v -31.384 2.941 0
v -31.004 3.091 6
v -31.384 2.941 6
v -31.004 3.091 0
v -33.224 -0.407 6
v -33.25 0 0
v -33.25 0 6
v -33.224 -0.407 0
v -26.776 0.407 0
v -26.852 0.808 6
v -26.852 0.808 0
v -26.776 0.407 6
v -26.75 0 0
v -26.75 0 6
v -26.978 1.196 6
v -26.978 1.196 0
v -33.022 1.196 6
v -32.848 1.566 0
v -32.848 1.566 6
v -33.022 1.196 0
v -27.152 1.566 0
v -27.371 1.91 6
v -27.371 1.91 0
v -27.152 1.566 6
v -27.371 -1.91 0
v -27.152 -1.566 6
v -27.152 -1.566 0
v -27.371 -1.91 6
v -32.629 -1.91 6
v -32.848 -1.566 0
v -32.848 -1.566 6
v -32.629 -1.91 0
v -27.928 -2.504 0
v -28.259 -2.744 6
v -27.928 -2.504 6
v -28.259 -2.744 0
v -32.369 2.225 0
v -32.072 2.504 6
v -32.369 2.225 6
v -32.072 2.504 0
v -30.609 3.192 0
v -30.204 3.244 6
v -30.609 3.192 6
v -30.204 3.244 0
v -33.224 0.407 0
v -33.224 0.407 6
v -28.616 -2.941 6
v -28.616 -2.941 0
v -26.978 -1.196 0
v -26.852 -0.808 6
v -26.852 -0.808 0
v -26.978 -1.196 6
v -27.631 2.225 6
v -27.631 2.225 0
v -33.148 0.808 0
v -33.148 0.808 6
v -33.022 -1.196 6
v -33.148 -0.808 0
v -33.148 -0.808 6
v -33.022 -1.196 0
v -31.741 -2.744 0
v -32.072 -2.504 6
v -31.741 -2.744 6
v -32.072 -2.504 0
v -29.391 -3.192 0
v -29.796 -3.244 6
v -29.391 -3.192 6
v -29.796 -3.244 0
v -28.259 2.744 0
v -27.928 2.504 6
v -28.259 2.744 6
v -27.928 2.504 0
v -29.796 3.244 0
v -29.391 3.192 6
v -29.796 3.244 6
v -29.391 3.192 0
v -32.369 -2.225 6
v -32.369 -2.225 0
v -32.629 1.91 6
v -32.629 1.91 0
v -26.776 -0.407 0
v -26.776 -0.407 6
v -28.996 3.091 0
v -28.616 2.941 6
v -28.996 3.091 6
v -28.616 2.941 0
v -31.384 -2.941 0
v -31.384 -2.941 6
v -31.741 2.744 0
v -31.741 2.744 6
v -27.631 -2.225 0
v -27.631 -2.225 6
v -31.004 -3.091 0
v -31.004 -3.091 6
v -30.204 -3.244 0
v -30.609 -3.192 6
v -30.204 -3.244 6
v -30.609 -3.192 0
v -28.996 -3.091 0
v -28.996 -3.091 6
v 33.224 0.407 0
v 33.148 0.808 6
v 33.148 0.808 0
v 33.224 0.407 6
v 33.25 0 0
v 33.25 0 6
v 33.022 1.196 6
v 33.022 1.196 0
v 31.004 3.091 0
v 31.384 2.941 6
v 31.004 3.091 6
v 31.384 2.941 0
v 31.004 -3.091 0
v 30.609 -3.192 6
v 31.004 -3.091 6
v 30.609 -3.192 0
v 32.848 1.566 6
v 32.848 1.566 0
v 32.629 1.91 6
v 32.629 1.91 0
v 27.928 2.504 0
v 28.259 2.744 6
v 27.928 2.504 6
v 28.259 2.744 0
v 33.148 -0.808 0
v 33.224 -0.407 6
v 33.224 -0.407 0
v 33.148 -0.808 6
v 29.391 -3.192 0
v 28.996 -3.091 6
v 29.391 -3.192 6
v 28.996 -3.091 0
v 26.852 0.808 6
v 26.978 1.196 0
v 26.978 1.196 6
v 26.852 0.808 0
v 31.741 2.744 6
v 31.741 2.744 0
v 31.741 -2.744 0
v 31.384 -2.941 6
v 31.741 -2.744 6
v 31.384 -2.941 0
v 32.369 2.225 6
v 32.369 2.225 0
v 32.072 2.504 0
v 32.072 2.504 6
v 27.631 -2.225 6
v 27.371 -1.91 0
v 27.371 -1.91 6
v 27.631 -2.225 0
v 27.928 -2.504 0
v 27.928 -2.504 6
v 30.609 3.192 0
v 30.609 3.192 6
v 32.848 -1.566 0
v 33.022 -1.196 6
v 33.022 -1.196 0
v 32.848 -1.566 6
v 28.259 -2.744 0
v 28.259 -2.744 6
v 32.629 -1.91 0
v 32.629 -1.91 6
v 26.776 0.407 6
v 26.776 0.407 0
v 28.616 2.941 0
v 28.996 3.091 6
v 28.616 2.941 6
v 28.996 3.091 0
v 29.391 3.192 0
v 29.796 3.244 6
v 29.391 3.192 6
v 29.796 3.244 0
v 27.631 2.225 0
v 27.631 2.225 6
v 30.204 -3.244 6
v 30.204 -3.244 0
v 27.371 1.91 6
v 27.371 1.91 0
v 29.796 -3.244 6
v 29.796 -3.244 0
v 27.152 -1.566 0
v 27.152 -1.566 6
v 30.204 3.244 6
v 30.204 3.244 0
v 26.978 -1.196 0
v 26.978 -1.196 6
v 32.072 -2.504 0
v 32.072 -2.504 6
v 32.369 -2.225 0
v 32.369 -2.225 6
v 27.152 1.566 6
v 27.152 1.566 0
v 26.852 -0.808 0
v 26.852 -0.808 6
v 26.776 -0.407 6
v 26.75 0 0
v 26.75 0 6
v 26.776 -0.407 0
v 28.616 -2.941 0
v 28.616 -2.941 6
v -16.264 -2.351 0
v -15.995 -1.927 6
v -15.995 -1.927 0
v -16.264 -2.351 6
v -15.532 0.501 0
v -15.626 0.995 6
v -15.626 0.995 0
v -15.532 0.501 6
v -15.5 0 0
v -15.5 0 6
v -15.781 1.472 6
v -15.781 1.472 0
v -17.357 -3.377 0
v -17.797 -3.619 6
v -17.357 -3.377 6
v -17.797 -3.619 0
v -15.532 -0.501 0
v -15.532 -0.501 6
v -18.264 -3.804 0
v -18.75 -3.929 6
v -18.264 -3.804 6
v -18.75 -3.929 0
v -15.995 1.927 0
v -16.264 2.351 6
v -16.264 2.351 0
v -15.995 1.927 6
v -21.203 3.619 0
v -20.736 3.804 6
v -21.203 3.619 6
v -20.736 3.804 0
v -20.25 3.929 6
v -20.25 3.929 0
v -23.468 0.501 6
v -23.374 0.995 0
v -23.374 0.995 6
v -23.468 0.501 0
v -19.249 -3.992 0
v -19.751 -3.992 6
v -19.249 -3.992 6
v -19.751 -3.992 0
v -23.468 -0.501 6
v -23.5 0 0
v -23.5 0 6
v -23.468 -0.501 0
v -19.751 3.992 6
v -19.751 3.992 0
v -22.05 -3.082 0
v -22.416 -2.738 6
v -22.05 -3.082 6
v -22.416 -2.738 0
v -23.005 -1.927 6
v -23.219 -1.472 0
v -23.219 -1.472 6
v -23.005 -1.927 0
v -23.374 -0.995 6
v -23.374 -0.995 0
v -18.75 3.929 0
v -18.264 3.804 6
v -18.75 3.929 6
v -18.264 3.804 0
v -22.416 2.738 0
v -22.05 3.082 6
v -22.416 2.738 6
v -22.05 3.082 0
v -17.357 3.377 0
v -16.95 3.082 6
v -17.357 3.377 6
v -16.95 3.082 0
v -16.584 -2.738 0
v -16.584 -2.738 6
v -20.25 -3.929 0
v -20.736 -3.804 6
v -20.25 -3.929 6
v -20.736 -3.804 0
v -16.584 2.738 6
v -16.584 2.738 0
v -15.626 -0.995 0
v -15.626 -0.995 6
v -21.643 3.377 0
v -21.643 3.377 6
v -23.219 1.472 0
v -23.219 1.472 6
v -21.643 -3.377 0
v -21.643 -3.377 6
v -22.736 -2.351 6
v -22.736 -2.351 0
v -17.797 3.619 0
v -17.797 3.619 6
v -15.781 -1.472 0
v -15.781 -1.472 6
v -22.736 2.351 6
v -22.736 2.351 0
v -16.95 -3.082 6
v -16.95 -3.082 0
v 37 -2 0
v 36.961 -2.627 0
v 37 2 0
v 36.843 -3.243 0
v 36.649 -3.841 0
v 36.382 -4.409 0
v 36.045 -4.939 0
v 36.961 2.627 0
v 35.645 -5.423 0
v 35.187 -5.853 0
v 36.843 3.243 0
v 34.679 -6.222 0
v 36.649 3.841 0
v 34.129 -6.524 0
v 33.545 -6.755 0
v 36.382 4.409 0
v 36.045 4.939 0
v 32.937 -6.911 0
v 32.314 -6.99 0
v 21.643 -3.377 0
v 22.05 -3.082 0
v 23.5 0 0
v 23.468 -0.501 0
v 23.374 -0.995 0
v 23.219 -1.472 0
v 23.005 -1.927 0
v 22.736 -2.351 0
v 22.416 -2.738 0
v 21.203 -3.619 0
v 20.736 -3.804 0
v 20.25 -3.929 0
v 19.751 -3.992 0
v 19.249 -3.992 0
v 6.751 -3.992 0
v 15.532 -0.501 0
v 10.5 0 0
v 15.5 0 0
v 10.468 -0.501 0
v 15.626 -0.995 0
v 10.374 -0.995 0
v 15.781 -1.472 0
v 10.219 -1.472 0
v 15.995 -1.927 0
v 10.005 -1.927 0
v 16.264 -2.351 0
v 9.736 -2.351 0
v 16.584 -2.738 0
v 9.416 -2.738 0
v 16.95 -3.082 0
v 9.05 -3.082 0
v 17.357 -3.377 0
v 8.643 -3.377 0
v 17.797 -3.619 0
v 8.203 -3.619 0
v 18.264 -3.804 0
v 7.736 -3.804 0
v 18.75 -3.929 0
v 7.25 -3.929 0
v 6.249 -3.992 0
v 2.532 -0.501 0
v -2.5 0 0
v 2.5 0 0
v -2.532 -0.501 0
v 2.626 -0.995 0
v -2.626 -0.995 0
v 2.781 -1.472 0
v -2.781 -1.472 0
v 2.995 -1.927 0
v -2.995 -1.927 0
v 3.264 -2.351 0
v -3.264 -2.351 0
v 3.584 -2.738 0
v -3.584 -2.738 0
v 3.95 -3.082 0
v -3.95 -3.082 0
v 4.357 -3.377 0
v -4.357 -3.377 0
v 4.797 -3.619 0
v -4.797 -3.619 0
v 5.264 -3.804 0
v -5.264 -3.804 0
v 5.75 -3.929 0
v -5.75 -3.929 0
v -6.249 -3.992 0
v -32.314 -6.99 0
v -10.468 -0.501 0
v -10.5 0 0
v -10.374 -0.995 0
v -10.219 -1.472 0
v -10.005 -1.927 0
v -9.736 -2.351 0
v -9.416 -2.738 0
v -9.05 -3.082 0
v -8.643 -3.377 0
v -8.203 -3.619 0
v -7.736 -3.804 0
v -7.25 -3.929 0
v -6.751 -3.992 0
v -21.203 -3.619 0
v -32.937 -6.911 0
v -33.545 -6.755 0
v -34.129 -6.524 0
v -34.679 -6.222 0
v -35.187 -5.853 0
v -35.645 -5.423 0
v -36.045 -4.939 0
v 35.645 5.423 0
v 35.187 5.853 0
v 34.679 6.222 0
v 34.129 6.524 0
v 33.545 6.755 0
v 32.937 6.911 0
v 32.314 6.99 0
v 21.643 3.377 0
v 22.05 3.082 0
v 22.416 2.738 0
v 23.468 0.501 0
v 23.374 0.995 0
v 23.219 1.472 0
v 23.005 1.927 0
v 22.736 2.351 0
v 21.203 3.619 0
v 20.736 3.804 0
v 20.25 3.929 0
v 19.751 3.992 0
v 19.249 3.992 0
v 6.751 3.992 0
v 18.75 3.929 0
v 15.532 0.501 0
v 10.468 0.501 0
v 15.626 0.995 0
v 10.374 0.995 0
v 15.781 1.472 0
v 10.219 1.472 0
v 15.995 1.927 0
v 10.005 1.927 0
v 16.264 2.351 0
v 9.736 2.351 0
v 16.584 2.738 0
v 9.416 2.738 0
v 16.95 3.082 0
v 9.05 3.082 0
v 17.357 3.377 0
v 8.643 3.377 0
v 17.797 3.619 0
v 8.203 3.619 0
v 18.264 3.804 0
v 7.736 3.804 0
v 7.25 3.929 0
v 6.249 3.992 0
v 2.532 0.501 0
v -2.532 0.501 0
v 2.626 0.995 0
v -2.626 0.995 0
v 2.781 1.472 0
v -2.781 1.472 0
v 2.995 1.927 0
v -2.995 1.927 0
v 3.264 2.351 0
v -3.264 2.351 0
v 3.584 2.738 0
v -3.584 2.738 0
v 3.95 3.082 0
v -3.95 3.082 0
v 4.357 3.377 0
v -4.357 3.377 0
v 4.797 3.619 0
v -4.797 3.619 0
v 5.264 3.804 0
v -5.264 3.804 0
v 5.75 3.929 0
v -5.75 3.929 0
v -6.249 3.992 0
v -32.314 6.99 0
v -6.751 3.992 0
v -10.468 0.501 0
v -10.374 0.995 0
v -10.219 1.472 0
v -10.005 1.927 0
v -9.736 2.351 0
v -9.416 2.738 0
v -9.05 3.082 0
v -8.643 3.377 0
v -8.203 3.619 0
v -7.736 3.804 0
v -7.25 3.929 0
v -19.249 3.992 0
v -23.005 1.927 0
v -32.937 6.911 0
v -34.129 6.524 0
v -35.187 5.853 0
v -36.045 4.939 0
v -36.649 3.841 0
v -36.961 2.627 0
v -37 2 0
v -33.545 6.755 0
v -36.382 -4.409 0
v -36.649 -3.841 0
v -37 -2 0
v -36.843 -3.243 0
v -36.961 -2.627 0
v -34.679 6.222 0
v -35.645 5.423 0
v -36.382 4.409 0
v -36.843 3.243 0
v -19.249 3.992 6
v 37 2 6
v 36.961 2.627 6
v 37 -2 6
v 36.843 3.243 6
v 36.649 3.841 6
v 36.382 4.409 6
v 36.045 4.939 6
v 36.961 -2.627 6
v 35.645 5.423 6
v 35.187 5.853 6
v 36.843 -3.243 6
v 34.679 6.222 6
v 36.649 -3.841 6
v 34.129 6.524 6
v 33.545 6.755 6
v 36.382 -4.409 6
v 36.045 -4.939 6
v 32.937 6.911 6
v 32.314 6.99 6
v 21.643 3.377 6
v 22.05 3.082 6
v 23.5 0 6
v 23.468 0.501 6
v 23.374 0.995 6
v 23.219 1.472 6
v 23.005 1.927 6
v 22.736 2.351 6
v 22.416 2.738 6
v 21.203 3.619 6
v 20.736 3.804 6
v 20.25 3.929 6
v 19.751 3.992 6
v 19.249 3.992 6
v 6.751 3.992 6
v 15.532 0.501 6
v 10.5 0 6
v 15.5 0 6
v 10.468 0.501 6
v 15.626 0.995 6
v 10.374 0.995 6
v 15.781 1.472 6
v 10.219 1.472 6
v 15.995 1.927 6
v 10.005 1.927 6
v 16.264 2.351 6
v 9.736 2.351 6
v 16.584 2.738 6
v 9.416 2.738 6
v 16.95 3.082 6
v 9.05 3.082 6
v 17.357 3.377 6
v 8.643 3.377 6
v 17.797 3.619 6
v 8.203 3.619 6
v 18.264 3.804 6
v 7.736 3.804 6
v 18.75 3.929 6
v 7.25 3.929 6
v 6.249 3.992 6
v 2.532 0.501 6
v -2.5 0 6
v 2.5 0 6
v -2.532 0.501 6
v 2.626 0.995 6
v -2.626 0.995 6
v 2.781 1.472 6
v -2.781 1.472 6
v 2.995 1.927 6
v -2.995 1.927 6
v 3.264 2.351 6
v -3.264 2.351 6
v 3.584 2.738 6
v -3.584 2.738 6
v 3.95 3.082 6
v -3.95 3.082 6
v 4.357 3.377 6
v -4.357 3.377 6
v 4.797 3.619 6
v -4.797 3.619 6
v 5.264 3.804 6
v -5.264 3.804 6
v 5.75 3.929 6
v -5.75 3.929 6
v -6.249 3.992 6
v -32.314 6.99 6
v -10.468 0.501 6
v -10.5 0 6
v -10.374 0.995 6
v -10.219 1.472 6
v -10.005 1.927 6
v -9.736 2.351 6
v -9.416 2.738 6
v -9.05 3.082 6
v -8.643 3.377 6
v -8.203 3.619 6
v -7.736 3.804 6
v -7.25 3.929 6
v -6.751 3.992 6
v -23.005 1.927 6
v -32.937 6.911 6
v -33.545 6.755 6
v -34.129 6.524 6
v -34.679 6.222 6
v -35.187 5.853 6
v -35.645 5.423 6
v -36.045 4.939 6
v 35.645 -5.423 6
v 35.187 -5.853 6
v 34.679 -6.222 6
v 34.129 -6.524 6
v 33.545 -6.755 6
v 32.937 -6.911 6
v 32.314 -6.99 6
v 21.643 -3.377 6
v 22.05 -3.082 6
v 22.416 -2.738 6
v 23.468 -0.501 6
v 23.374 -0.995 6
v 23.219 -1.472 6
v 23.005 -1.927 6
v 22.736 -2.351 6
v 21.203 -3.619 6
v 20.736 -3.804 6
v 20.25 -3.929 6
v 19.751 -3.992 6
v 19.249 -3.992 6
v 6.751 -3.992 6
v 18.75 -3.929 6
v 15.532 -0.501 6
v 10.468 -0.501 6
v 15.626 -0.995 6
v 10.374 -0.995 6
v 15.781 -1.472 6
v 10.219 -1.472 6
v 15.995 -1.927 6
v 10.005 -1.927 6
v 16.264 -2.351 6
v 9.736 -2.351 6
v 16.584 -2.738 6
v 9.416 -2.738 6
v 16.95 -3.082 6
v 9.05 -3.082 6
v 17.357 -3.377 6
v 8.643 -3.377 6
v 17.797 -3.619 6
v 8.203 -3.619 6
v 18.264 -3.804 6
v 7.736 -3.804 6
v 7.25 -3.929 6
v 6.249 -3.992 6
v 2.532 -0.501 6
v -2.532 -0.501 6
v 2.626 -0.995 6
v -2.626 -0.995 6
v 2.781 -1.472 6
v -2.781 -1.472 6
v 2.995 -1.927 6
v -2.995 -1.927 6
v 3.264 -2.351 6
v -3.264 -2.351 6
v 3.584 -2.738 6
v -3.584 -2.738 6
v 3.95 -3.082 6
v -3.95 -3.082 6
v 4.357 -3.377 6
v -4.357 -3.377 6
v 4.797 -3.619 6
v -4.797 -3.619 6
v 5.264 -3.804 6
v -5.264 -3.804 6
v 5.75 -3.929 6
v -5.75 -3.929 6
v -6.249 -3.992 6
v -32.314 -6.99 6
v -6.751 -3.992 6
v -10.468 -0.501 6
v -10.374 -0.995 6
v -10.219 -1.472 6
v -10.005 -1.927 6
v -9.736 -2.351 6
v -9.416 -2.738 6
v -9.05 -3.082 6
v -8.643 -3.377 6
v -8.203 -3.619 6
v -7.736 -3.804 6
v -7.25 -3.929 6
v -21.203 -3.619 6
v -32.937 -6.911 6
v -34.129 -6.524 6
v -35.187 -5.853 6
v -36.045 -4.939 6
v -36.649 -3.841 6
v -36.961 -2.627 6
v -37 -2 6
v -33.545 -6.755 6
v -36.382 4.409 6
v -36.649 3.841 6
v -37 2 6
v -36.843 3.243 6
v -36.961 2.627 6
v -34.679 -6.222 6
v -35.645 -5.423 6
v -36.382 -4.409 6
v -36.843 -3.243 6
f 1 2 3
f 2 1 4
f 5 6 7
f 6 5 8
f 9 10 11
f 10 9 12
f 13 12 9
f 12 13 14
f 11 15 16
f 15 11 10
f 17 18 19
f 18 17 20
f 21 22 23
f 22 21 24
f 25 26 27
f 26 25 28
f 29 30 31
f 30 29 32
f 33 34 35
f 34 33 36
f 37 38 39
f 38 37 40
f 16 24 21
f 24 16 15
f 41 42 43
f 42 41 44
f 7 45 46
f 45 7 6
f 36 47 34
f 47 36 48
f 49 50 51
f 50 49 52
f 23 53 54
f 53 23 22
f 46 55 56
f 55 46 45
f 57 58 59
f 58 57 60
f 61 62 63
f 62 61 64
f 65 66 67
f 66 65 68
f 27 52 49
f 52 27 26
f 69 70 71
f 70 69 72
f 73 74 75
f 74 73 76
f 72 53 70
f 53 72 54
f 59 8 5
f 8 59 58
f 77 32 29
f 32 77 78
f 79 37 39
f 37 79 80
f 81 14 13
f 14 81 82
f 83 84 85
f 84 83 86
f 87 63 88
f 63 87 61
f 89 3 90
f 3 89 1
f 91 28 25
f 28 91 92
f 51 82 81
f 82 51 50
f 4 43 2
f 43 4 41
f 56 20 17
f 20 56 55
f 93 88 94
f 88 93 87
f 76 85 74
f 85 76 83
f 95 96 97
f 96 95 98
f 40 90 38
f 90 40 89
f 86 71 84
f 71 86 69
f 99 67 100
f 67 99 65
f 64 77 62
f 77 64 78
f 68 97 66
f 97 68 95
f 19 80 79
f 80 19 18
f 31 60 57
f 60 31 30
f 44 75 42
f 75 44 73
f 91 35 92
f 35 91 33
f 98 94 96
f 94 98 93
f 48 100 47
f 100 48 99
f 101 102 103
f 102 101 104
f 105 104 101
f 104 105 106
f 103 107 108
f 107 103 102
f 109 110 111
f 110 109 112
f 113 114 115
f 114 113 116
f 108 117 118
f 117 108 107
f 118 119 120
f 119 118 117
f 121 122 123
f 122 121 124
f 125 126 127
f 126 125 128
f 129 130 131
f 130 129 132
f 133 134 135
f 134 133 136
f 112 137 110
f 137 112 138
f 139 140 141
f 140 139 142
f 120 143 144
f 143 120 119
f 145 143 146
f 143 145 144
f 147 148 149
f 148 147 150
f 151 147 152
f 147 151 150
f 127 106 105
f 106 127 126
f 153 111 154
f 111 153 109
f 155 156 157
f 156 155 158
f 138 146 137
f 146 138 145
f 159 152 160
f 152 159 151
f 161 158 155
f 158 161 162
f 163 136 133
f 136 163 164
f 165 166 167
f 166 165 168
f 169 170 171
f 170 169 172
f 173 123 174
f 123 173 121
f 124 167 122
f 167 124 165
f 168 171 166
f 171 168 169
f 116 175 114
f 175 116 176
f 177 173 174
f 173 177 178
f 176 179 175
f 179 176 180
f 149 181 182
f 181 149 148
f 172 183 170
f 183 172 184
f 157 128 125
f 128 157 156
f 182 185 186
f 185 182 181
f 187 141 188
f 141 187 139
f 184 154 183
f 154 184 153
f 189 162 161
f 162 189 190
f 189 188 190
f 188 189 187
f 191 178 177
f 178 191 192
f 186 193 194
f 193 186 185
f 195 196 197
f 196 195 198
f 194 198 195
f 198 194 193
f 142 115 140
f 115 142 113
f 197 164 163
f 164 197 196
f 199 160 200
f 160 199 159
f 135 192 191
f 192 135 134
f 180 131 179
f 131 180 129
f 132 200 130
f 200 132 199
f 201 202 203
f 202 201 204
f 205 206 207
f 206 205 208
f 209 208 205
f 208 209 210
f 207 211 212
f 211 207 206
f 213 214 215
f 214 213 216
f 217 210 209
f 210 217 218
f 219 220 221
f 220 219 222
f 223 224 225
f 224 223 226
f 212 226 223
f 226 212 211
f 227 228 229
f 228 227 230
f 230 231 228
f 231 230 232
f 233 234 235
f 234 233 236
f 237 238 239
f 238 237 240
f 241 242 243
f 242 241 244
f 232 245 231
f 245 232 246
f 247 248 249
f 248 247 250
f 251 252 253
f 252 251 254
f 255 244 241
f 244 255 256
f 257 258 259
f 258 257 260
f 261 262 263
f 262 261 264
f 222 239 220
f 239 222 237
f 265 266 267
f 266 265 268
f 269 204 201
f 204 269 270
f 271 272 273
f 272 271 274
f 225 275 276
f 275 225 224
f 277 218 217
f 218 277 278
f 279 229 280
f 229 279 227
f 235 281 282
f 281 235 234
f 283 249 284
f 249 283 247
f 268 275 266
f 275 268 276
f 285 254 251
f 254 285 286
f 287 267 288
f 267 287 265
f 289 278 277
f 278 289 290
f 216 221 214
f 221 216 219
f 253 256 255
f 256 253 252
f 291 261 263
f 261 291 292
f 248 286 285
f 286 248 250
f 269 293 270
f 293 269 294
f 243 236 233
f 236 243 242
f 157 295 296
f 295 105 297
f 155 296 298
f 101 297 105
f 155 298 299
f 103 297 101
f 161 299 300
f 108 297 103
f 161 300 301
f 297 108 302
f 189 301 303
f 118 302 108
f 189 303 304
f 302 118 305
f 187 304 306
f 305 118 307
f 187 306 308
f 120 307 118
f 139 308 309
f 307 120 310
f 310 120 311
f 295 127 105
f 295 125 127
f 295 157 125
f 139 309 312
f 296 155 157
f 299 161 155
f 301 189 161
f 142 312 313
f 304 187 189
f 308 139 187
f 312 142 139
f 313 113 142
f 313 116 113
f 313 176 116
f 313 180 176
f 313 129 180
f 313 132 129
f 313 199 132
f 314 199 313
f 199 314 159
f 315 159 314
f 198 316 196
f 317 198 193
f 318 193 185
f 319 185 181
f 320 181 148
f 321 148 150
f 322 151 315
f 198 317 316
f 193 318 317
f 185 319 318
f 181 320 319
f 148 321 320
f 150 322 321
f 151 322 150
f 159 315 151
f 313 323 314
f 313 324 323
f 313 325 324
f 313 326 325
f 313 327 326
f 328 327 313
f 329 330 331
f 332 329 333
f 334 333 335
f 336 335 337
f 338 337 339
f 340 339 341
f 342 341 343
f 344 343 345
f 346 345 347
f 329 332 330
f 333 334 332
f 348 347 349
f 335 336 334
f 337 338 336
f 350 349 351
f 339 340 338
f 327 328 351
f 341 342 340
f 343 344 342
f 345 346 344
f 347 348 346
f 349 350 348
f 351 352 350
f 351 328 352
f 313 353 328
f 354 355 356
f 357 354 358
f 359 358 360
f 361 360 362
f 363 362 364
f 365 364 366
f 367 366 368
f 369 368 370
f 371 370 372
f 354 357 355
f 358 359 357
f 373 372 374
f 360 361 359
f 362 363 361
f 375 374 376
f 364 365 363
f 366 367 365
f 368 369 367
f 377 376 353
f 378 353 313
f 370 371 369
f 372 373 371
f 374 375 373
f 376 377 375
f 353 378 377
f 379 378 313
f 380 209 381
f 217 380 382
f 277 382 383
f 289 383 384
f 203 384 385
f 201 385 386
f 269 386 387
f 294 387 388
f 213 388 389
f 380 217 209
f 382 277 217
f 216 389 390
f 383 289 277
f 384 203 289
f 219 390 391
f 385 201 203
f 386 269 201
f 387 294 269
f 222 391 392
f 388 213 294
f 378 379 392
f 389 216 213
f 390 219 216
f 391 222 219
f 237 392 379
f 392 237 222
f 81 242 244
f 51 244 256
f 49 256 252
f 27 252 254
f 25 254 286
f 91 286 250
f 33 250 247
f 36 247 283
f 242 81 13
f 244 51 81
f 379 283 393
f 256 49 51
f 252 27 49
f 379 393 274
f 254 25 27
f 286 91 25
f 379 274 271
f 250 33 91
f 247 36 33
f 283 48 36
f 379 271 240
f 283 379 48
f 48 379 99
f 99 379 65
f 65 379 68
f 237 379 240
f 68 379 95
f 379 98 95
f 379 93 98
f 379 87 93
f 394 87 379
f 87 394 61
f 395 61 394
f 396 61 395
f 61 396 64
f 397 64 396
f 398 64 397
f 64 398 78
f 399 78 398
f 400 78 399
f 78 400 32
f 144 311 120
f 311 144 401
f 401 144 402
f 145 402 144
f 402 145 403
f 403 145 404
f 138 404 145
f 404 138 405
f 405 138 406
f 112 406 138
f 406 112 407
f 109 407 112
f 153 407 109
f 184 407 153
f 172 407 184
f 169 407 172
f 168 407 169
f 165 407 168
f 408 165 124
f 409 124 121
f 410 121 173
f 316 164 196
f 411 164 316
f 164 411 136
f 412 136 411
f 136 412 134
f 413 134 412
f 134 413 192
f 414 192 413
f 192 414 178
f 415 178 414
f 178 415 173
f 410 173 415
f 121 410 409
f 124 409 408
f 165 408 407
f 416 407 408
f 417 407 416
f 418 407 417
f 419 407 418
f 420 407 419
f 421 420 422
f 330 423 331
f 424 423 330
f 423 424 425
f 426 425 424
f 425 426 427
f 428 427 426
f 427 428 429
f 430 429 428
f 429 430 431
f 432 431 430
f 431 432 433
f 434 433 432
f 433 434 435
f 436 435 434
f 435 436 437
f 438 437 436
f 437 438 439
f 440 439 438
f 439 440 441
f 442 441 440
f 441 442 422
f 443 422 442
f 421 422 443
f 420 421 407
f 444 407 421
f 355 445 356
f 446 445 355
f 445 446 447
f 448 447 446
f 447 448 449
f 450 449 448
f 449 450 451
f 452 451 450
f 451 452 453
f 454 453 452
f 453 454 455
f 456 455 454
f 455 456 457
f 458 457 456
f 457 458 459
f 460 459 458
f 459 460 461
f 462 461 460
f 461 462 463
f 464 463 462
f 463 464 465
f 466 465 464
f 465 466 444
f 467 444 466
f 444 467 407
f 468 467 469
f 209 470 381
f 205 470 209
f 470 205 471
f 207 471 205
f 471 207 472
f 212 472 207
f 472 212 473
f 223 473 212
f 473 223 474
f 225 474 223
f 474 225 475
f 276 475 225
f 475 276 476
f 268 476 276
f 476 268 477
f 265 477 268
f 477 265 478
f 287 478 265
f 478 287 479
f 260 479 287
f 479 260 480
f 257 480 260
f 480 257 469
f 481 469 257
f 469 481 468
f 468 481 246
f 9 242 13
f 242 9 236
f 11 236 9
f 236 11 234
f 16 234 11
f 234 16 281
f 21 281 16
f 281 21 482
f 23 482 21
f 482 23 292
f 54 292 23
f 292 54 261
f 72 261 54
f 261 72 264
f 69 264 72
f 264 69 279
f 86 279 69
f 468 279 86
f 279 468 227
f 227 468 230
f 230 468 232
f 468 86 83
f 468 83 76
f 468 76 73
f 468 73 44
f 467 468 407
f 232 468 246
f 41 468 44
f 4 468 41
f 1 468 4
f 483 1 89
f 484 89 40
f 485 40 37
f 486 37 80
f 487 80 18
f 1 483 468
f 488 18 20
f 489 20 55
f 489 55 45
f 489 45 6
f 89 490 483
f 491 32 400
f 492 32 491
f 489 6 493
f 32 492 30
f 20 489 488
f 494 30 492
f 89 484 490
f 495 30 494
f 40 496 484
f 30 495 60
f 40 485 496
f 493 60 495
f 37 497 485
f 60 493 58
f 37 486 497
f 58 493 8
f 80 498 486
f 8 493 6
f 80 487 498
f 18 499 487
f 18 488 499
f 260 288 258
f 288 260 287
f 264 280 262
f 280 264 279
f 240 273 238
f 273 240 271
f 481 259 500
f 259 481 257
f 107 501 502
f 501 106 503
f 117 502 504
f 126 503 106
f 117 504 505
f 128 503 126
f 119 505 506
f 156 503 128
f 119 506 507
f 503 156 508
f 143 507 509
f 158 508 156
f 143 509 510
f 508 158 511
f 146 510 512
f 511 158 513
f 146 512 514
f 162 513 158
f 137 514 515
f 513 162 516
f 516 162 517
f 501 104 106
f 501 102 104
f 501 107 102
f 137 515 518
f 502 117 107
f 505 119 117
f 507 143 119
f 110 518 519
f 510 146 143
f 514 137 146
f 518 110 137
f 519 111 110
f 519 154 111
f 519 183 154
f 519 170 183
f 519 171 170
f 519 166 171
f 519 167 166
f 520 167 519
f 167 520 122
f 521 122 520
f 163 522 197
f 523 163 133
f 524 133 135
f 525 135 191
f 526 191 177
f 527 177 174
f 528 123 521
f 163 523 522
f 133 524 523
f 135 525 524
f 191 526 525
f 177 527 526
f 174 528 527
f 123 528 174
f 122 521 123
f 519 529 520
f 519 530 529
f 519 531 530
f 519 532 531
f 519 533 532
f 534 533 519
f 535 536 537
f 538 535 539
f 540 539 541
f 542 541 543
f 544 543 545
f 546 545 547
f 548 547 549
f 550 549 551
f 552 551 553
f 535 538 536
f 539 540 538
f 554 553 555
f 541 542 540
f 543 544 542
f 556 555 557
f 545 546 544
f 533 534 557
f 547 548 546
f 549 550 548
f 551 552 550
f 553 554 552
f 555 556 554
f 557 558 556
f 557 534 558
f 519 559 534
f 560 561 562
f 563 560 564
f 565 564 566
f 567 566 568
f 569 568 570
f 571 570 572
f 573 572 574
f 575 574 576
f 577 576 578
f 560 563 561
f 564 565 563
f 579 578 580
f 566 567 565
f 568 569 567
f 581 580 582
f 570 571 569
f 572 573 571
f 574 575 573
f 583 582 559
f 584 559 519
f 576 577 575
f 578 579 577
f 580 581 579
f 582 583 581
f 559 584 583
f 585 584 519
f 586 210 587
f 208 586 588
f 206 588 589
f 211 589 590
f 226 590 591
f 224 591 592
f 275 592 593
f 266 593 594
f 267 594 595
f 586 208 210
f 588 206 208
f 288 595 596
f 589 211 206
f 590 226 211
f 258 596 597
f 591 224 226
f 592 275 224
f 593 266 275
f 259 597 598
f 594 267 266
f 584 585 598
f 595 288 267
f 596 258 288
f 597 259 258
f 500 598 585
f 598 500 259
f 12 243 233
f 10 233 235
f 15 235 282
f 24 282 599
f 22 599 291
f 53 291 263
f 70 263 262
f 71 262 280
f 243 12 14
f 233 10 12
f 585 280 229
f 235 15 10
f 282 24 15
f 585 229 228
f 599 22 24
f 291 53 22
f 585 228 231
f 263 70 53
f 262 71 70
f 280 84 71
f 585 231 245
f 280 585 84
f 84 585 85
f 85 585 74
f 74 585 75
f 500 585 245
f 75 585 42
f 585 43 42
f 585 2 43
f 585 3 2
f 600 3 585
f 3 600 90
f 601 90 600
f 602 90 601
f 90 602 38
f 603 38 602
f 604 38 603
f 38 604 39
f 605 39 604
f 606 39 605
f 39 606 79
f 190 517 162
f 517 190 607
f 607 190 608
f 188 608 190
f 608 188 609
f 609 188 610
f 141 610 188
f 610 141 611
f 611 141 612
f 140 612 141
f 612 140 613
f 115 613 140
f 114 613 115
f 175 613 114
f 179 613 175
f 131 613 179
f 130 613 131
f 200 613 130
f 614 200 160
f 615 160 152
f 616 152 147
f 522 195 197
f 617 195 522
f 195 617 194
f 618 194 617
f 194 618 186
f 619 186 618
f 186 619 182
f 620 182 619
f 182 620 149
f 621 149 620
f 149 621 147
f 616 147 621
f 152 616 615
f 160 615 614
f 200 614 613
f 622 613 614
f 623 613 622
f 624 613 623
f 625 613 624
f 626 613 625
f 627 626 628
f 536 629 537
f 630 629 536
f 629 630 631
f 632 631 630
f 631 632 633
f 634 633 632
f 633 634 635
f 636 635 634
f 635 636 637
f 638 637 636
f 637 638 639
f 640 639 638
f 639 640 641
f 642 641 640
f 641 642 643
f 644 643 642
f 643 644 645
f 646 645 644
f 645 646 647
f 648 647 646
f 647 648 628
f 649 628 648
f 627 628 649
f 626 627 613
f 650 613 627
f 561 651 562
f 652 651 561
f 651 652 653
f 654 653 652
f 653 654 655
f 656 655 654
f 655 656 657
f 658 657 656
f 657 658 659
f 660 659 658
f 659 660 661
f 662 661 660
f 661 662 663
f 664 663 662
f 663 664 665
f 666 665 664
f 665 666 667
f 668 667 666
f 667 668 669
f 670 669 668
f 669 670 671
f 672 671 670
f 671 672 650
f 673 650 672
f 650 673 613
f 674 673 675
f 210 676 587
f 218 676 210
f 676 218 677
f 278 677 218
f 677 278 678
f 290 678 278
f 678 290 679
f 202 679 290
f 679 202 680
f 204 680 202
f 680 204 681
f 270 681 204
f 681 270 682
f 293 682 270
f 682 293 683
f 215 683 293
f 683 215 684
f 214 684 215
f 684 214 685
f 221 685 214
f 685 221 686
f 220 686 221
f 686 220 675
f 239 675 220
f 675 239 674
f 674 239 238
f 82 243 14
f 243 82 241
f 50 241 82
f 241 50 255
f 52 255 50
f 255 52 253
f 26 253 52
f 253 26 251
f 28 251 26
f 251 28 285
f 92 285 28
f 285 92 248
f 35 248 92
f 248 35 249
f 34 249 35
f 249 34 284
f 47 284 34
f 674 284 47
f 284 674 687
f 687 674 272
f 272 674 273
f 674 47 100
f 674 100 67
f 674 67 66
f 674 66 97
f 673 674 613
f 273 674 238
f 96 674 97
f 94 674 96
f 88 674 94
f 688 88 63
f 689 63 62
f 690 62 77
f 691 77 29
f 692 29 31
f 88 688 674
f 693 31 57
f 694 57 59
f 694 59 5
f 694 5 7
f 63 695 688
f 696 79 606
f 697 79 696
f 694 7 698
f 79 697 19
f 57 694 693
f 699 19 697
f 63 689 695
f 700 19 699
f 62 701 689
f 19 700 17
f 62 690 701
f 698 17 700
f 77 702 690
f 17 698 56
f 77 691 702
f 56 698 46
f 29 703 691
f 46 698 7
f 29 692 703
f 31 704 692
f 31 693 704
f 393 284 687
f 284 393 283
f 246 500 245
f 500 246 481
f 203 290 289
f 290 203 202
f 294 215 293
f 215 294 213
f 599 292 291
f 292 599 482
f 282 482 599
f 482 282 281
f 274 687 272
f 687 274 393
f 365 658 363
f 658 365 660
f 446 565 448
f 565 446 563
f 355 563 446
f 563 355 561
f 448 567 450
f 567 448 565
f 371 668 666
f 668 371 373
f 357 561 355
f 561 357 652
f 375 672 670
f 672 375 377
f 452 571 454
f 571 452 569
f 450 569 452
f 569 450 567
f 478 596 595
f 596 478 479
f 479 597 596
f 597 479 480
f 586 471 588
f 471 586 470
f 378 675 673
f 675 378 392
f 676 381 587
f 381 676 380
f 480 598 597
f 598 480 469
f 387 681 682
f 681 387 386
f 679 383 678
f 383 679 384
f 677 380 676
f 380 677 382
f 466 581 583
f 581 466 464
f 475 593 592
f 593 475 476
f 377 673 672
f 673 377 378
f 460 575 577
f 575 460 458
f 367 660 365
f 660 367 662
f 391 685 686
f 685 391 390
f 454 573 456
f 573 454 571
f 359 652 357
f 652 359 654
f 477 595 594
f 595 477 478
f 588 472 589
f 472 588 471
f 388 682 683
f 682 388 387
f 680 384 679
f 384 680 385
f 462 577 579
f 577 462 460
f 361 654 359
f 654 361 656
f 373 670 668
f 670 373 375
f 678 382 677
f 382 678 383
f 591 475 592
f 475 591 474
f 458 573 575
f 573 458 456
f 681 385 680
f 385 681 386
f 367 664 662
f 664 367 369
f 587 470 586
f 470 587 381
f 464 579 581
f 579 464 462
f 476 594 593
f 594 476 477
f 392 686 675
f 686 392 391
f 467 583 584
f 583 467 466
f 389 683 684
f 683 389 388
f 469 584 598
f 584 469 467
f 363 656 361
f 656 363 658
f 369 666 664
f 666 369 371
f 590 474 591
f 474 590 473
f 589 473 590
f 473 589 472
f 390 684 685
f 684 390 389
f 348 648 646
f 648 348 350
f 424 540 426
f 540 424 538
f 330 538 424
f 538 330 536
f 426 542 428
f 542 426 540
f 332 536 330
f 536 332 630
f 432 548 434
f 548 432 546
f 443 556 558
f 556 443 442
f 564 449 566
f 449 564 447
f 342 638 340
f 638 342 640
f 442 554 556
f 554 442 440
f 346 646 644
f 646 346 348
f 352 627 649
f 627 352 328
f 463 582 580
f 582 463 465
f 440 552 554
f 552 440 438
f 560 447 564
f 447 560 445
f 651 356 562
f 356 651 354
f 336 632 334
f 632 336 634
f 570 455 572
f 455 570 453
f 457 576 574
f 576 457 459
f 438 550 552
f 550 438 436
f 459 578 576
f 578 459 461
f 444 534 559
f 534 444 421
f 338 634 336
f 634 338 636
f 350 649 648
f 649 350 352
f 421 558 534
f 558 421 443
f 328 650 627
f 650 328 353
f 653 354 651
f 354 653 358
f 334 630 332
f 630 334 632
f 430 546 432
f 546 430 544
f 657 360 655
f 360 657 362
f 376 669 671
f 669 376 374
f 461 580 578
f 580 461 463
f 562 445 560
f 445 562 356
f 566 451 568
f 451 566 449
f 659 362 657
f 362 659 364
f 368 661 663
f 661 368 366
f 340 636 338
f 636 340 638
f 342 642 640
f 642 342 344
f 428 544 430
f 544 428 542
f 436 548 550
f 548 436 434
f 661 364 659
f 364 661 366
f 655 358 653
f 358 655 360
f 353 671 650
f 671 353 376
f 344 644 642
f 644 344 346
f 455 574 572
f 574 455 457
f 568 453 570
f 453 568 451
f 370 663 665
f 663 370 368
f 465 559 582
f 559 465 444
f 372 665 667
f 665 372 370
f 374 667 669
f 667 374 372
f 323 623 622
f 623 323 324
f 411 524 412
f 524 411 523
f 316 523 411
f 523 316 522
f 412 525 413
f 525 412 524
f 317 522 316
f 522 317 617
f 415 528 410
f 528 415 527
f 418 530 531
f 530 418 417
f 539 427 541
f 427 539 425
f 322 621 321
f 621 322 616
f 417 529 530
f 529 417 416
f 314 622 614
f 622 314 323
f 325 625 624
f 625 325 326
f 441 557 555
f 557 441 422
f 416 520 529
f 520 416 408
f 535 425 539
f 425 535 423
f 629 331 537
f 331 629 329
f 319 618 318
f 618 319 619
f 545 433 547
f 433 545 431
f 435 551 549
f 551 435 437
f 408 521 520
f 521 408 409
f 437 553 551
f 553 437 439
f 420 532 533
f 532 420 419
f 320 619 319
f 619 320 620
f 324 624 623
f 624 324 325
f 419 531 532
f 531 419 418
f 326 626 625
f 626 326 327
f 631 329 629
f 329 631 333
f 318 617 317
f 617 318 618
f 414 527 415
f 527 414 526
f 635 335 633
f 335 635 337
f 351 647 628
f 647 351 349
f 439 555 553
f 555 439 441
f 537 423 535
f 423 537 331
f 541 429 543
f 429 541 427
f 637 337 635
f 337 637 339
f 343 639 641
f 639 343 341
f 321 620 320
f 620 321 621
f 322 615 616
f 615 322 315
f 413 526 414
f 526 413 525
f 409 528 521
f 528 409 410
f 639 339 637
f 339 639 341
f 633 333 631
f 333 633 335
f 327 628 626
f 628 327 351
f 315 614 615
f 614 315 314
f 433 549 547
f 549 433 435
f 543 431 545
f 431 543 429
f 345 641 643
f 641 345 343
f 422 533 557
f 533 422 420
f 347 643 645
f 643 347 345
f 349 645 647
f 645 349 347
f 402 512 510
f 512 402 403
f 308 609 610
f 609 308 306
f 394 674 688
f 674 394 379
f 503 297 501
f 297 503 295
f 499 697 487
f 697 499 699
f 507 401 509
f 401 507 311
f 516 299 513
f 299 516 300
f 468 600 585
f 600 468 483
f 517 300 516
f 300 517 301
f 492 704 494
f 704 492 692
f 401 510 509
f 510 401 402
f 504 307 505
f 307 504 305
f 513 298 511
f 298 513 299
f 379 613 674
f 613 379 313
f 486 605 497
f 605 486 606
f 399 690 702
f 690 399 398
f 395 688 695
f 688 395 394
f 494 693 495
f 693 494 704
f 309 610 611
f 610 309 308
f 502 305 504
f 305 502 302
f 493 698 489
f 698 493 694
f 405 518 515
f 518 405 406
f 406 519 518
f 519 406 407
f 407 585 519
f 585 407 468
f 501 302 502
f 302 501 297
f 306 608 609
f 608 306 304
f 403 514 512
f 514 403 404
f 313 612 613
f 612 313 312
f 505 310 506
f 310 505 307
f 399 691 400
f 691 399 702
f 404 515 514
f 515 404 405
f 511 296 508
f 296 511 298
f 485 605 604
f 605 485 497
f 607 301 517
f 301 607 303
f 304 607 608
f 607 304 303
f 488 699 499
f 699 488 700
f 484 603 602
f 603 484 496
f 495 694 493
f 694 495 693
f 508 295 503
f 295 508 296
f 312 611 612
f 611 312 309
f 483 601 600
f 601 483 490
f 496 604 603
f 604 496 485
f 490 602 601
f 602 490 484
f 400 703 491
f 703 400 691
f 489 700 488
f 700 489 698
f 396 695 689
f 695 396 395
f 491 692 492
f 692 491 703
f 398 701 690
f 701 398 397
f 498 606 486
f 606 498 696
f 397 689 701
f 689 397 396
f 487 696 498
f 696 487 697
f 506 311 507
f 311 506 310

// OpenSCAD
$fn = 50;


difference() {
	union() {
		hull() {
			translate(v = [-32.0000000000, 2.0000000000, 0]) {
				cylinder(h = 6, r = 5);
			}
			translate(v = [32.0000000000, 2.0000000000, 0]) {
				cylinder(h = 6, r = 5);
			}
			translate(v = [-32.0000000000, -2.0000000000, 0]) {
				cylinder(h = 6, r = 5);
			}
			translate(v = [32.0000000000, -2.0000000000, 0]) {
				cylinder(h = 6, r = 5);
			}
		}
	}
	union() {
		#translate(v = [-30.0000000000, 0.0000000000, 0]) {
			cylinder(h = 6, r = 3.2500000000);
		}
		#translate(v = [30.0000000000, 0.0000000000, 0]) {
			cylinder(h = 6, r = 3.2500000000);
		}
		#translate(v = [-30.0000000000, 0.0000000000, -100.0000000000]) {
			cylinder(h = 200, r = 3.2500000000);
		}
		#translate(v = [-30.0000000000, 0.0000000000, -100.0000000000]) {
			cylinder(h = 200, r = 3.2500000000);
		}
		#translate(v = [30.0000000000, 0.0000000000, -100.0000000000]) {
			cylinder(h = 200, r = 3.2500000000);
		}
		#translate(v = [30.0000000000, 0.0000000000, -100.0000000000]) {
			cylinder(h = 200, r = 3.2500000000);
		}
		#translate(v = [-30.0000000000, 0.0000000000, 0]) {
			cylinder(h = 6, r = 1.8000000000);
		}
		#translate(v = [30.0000000000, 0.0000000000, 0]) {
			cylinder(h = 6, r = 1.8000000000);
		}
		#translate(v = [-30.0000000000, 0.0000000000, 0]) {
			cylinder(h = 6, r = 1.8000000000);
		}
		#translate(v = [30.0000000000, 0.0000000000, 0]) {
			cylinder(h = 6, r = 1.8000000000);
		}
		#translate(v = [-30.0000000000, 0.0000000000, 0]) {
			cylinder(h = 6, r = 1.8000000000);
		}
		#translate(v = [30.0000000000, 0.0000000000, 0]) {
			cylinder(h = 6, r = 1.8000000000);
		}
		#translate(v = [-19.5000000000, 0, 0]) {
			cylinder(h = 6, r = 4.0000000000);
		}
		#translate(v = [-6.5000000000, 0, 0]) {
			cylinder(h = 6, r = 4.0000000000);
		}
		#translate(v = [6.5000000000, 0, 0]) {
			cylinder(h = 6, r = 4.0000000000);
		}
		#translate(v = [19.5000000000, 0, 0]) {
			cylinder(h = 6, r = 4.0000000000);
		}
	}
}
